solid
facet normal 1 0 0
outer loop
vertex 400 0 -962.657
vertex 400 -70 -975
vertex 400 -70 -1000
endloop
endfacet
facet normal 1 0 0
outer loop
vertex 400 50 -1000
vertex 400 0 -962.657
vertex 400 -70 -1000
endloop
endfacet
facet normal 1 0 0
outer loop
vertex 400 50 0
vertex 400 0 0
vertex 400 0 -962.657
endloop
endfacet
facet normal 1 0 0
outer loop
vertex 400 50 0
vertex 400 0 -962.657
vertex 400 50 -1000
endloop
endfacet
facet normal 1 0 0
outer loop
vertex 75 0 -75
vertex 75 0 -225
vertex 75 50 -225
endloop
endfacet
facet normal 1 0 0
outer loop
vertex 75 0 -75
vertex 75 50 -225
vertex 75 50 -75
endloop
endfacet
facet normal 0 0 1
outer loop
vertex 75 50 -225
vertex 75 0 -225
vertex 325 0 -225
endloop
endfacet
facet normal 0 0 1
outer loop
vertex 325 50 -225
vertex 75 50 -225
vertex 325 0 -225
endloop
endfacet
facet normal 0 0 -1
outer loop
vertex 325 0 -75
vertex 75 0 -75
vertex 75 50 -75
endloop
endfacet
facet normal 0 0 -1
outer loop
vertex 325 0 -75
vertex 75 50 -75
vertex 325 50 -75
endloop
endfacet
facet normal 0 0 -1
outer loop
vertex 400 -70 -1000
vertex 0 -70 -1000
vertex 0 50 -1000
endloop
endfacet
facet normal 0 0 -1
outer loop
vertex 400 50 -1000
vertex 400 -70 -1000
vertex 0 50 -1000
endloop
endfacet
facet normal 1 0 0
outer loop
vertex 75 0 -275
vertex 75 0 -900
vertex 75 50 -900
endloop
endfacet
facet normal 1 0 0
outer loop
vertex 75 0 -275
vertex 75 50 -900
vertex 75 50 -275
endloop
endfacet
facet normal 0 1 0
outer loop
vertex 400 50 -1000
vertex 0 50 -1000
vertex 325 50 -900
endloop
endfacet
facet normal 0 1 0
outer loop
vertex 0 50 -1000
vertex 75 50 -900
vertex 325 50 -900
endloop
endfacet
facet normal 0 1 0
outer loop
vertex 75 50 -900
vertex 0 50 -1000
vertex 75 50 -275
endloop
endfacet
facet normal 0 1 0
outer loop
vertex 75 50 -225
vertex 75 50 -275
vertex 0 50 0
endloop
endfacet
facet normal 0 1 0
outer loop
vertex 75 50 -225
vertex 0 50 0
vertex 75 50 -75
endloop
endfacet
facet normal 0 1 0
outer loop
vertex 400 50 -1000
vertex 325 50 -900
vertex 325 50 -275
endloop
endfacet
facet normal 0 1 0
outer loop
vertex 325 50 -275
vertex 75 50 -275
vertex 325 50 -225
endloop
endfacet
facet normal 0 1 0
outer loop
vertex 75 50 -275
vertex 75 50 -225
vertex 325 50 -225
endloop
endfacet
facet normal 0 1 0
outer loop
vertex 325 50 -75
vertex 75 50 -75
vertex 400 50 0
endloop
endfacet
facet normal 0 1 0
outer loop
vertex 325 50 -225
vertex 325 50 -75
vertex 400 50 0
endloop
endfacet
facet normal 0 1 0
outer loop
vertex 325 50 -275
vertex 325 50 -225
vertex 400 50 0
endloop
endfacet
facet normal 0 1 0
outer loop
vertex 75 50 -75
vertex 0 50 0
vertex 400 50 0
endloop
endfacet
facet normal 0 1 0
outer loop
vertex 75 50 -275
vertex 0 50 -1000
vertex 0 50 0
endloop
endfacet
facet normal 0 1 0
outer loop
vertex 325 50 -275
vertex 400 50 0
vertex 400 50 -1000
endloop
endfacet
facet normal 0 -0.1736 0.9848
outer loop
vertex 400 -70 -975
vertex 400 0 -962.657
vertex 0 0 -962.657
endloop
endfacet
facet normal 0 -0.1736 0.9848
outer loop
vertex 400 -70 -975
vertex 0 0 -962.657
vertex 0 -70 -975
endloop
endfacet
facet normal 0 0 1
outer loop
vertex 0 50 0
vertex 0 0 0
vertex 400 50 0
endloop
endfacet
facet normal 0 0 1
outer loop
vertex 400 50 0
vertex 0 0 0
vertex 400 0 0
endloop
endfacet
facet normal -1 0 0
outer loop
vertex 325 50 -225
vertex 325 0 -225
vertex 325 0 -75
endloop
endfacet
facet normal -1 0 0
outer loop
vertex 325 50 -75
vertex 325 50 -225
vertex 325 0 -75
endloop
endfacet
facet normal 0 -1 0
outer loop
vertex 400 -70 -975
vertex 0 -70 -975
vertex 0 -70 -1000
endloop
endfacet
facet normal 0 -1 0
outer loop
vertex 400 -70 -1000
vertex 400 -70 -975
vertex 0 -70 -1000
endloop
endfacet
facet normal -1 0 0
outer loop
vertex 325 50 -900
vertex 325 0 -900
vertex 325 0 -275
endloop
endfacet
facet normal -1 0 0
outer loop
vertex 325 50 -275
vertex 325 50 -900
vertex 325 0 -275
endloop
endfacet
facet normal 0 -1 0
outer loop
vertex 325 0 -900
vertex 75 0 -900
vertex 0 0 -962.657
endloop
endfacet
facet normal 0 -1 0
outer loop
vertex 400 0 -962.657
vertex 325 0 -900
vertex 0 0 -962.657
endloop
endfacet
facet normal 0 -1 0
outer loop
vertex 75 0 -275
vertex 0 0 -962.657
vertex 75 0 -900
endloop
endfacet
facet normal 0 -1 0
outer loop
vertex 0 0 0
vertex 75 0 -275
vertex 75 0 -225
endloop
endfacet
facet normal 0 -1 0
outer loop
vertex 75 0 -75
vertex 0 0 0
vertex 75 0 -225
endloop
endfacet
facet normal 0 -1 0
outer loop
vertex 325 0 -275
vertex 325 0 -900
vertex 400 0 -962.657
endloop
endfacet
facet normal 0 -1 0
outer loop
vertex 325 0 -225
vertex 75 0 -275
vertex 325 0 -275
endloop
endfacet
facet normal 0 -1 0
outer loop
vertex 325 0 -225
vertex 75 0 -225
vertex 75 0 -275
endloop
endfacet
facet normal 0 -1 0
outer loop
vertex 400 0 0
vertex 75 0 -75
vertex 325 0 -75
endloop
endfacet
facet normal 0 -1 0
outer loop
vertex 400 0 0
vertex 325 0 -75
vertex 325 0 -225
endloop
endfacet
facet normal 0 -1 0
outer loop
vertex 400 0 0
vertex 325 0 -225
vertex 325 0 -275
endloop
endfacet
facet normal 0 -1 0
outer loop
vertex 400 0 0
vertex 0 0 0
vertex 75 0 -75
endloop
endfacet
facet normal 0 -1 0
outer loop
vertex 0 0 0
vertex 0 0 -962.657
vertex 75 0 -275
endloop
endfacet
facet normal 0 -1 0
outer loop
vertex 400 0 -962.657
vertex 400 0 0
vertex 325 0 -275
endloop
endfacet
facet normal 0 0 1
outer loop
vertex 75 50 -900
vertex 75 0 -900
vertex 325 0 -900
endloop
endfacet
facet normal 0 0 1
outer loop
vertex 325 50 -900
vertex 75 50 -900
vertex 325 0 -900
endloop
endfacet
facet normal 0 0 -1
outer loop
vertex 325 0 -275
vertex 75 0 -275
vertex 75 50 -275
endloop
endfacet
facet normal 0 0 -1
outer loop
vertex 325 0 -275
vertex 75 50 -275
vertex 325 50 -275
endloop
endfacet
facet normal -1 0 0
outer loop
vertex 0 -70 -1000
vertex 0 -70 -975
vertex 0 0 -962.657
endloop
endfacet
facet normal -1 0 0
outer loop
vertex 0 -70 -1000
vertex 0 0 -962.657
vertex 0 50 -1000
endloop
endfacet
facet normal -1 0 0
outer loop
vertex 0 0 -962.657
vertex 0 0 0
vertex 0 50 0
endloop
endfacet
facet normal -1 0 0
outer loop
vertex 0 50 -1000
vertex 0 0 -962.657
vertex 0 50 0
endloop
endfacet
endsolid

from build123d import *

# Parameters (mm, degrees)
F0_W     = 400
F0_H     = 1000
F0_W_2   = 250
F0_H_2   = 625
F0_H_3   = 150
F1_DEPTH = 50
F3_DEPTH = 400


with BuildPart() as f1:
    # F0 (on Front) → F1 (new body)
    with BuildSketch(Plane.XZ):
        with Locations((200, -500)):
            Rectangle(F0_W, F0_H)
        with Locations((200, -587.5)):
            Rectangle(F0_W_2, F0_H_2, mode=Mode.SUBTRACT)
        with Locations((200, -150)):
            Rectangle(F0_W_2, F0_H_3, mode=Mode.SUBTRACT)
    extrude(amount=-F1_DEPTH)

    # F2 (on face) → F3 (join)
    with BuildSketch(Plane.YZ.offset(400)):
        Polygon((-70, -1000), (0, -1000), (0, -962.657111), (-70, -975), align=None)
    extrude(amount=-F3_DEPTH)


solid = f1.part
